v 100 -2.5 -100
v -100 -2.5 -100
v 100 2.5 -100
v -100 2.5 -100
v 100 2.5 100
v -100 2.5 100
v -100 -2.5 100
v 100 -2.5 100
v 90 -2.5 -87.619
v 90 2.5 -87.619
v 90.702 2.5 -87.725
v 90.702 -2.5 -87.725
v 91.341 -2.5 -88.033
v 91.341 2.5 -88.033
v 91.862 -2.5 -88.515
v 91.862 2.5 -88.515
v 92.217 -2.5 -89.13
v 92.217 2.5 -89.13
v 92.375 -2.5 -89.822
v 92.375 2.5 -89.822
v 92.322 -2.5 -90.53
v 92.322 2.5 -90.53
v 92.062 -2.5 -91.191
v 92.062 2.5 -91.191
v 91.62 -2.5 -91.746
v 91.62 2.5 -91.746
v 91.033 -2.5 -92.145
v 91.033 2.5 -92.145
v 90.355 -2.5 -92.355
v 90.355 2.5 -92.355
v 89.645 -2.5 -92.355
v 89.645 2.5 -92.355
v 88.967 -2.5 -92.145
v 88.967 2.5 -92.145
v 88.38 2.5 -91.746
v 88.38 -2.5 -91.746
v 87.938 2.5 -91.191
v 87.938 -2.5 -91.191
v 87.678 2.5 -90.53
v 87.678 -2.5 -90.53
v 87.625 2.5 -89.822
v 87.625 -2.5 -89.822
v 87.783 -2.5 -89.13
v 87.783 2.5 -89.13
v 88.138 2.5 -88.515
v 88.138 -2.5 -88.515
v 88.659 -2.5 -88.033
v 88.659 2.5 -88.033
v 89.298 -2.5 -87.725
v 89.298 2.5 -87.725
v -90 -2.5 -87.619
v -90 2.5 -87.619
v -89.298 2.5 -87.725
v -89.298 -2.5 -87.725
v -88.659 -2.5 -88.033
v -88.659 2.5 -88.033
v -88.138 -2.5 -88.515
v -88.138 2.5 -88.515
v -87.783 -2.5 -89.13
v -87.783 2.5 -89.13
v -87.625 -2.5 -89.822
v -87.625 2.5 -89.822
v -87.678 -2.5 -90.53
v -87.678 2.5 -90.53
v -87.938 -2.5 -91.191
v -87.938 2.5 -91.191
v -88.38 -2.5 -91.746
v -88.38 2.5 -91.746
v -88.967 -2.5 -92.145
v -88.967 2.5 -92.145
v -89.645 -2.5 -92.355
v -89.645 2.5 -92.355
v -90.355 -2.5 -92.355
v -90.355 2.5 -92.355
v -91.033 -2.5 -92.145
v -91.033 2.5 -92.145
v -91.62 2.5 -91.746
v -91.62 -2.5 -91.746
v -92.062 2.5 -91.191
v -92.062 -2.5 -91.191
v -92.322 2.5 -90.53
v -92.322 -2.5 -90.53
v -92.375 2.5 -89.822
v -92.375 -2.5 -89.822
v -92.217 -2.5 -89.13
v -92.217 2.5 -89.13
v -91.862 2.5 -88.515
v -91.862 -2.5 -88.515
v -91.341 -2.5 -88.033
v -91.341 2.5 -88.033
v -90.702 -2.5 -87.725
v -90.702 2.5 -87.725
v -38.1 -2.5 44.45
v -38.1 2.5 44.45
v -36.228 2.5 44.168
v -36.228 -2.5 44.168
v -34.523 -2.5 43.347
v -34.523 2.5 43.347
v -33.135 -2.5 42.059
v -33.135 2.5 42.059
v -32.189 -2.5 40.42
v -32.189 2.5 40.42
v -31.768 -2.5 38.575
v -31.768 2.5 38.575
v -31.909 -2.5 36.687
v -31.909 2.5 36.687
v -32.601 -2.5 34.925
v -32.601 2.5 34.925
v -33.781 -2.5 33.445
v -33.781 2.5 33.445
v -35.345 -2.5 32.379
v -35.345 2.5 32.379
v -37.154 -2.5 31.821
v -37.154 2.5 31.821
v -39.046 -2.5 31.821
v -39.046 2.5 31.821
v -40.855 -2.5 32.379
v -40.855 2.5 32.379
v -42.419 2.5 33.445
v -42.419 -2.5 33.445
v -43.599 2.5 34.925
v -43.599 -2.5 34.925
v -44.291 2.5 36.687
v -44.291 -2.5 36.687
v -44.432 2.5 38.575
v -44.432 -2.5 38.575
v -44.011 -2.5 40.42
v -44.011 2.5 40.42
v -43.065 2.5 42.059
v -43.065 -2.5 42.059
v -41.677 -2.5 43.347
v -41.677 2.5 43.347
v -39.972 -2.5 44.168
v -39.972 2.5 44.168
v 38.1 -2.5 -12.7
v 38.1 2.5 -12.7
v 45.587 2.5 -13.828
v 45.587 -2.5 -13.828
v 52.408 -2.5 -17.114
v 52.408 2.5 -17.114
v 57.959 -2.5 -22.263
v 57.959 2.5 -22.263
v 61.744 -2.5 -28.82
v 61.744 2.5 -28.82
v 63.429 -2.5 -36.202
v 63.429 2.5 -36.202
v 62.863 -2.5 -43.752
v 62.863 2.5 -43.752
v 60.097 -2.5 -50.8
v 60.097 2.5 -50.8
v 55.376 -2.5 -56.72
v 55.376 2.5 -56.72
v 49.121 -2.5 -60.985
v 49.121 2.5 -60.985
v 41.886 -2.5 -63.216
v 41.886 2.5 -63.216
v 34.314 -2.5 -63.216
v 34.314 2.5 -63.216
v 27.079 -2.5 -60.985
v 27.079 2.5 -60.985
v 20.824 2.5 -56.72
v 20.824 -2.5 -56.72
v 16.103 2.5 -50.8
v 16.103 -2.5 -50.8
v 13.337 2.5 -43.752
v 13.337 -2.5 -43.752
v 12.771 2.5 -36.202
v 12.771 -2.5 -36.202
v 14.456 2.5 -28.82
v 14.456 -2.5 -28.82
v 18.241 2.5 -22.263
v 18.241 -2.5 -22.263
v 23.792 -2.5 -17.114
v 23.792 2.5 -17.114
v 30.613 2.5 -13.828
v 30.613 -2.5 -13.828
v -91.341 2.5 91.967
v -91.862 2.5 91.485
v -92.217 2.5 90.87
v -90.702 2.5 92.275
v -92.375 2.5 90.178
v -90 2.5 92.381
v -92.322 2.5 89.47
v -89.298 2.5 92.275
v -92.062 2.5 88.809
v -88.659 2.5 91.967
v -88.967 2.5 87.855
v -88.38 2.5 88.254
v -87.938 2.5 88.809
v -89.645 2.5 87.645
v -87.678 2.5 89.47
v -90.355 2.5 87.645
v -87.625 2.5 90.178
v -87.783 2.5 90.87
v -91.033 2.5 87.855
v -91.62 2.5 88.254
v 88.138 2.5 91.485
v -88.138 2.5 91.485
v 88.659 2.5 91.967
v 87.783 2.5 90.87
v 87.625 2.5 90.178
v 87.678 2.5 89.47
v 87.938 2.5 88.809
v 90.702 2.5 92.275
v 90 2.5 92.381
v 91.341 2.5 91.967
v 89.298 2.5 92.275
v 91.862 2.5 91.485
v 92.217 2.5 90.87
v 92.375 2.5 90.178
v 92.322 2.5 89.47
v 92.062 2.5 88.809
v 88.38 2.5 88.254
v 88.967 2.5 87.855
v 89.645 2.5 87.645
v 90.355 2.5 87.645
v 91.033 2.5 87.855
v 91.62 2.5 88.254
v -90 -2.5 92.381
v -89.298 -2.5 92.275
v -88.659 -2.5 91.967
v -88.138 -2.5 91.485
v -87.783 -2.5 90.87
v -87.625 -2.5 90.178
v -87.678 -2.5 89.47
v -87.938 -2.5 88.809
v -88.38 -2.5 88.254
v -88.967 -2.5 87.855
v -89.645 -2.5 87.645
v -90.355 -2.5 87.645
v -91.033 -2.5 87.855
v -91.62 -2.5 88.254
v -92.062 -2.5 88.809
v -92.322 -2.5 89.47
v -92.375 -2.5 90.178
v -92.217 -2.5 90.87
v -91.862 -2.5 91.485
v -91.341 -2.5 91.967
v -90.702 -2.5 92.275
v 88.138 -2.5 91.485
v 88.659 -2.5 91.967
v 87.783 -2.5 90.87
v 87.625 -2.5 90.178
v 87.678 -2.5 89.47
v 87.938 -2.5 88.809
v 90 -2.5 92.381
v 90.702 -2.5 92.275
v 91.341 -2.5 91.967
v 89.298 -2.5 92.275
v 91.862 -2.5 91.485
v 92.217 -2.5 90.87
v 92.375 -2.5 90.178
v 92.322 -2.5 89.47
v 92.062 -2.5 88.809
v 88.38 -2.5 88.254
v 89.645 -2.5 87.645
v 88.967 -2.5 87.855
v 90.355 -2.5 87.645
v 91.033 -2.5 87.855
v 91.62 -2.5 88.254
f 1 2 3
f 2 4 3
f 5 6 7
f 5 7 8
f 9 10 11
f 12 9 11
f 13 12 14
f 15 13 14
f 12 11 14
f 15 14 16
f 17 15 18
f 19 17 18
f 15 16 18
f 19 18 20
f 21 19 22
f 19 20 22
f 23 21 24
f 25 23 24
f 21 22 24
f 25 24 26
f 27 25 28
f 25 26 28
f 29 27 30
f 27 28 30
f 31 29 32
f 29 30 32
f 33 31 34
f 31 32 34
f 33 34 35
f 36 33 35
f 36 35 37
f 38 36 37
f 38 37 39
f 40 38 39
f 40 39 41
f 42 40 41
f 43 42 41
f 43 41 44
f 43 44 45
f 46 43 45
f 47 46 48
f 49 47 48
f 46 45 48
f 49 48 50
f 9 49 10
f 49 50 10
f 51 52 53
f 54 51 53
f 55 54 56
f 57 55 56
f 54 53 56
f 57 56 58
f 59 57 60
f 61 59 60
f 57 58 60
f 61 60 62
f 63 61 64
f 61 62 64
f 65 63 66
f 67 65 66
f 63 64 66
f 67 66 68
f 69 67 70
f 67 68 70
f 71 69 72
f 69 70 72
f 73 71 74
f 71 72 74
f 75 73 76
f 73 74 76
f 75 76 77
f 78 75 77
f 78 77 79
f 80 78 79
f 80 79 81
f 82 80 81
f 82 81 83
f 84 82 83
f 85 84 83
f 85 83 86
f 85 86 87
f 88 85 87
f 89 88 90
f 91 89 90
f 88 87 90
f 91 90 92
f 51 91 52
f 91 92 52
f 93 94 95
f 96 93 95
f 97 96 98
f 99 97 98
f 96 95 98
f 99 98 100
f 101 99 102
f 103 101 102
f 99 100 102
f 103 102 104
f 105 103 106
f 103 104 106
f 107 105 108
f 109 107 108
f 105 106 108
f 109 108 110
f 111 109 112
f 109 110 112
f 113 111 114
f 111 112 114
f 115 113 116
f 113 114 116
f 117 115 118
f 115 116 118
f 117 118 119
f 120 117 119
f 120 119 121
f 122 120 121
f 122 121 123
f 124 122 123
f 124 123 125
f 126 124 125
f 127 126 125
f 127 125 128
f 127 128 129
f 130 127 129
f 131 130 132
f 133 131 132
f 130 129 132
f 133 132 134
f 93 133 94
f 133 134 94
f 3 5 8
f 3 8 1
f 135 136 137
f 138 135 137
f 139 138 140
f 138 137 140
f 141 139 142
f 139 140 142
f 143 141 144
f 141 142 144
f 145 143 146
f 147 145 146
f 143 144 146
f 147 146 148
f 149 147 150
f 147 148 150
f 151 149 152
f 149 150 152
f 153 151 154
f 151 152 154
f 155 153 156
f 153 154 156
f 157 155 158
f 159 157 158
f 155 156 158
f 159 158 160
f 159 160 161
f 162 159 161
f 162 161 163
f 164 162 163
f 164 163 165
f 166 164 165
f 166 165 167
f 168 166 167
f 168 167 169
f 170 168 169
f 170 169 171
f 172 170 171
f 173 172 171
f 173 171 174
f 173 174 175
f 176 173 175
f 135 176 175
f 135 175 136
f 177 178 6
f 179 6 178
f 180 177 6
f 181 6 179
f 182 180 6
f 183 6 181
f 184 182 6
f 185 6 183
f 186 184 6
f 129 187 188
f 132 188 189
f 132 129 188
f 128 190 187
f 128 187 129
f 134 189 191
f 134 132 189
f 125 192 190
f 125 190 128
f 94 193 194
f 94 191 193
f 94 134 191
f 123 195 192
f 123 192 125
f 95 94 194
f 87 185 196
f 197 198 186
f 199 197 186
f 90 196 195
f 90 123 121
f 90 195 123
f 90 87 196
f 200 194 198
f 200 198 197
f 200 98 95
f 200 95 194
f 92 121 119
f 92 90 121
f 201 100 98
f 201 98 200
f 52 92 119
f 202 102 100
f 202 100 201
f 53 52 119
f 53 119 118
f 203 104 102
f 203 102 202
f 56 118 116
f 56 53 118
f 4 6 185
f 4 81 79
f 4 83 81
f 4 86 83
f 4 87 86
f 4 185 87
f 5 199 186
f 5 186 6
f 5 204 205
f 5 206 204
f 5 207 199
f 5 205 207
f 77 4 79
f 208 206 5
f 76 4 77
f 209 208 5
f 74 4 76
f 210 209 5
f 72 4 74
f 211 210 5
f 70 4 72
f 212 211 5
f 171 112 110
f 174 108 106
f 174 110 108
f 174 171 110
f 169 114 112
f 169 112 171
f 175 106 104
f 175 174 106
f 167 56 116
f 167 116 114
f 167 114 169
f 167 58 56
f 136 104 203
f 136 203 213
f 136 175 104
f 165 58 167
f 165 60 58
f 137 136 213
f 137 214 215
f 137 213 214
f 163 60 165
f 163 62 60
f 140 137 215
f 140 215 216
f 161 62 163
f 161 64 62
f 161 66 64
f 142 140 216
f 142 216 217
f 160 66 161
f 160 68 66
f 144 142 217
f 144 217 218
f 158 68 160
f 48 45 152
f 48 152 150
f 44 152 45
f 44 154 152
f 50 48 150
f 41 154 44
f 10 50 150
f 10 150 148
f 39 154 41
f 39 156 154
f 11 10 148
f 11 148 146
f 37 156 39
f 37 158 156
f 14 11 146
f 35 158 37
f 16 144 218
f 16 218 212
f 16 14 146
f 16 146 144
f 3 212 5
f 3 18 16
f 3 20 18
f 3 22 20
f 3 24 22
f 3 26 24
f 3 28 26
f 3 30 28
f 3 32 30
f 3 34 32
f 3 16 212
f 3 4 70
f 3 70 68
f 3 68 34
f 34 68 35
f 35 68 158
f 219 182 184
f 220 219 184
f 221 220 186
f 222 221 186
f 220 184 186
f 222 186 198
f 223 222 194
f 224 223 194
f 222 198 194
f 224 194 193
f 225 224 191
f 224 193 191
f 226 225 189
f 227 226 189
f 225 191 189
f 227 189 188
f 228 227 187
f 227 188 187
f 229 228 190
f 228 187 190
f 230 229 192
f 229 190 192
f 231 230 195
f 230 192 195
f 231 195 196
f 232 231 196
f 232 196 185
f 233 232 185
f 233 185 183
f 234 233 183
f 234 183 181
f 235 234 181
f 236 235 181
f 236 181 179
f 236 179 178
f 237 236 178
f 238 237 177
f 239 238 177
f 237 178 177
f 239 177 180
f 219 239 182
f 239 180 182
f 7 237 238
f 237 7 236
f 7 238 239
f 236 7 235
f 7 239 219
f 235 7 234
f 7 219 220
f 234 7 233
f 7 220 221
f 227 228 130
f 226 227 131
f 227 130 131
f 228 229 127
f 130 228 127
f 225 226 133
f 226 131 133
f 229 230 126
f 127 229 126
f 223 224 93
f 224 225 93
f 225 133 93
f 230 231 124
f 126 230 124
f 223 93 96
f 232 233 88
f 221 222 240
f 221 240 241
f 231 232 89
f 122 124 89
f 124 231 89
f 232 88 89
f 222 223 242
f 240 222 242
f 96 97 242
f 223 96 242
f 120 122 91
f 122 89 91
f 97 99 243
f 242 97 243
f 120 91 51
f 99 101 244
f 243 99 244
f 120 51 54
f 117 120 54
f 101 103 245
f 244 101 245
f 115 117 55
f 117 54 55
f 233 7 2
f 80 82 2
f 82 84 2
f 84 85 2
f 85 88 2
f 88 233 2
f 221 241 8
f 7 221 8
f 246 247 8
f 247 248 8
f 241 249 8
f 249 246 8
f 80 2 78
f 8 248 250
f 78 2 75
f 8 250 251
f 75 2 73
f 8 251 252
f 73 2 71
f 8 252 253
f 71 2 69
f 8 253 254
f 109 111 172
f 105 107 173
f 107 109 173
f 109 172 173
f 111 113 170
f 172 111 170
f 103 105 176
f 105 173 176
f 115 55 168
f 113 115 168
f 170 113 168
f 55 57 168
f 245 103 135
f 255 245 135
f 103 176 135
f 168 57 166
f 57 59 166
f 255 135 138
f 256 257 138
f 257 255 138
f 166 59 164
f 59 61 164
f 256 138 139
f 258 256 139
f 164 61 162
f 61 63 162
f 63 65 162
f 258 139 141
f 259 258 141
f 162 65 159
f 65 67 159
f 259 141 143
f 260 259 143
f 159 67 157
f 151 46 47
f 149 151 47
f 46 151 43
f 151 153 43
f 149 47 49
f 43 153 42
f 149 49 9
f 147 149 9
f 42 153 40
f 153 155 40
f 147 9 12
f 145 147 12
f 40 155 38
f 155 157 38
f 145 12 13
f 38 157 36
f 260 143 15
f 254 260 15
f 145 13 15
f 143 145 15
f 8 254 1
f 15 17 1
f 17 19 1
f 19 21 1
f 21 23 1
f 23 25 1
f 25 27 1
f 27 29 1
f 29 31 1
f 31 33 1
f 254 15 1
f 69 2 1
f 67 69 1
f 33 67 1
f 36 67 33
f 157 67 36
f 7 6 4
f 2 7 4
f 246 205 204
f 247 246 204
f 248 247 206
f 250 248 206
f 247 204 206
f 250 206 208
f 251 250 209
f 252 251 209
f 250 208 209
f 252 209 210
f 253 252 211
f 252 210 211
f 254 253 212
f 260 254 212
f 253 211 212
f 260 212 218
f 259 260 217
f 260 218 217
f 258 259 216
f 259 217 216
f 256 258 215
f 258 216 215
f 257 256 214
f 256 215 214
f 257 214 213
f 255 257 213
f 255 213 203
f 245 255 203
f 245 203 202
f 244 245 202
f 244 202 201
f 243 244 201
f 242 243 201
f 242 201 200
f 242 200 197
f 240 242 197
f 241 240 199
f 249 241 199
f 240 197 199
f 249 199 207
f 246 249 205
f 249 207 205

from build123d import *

# Parameters (mm, degrees)
SKETCH1_W           = 200
SKETCH1_H           = 200
BOSS_EXTRUDE1_DEPTH = 2.5
SKETCH2_R           = 2.38125
CUT_EXTRUDE1_DEPTH  = 5
SKETCH3_R           = 6.35
CUT_EXTRUDE2_DEPTH  = 5
SKETCH4_R           = 25.4
CUT_EXTRUDE3_DEPTH  = 142.509716981


with BuildPart() as part:
    # Sketch1 → Boss-Extrude1 (new, symmetric)
    with BuildSketch(Plane(origin=(0, 0, 0), x_dir=(1, 0, 0), z_dir=(0, 1, 0))):
        Rectangle(SKETCH1_W, SKETCH1_H)
    extrude(amount=BOSS_EXTRUDE1_DEPTH, both=True)

    # Sketch2 → Cut-Extrude1 (cut)
    with BuildSketch(Plane(origin=(0, 2.5, 0), x_dir=(1, 0, 0), z_dir=(0, 1, 0))):
        with Locations(Location((-90, 90, 0), (0, 0, 270))):
            Circle(SKETCH2_R)
        with Locations(Location((90, 90, 0), (0, 0, 270))):
            Circle(SKETCH2_R)
        with Locations(Location((-90, -90, 0), (0, 0, 270))):
            Circle(SKETCH2_R)
        with Locations(Location((90, -90, 0), (0, 0, 270))):
            Circle(SKETCH2_R)
    extrude(amount=-CUT_EXTRUDE1_DEPTH, mode=Mode.SUBTRACT)

    # Sketch3 → Cut-Extrude2 (cut)
    with BuildSketch(Plane(origin=(0, 2.5, 0), x_dir=(1, 0, 0), z_dir=(0, 1, 0))):
        with Locations(Location((-38.1, -38.1, 0), (0, 0, 270))):
            Circle(SKETCH3_R)
    extrude(amount=-CUT_EXTRUDE2_DEPTH, mode=Mode.SUBTRACT)

    # Sketch4 → Cut-Extrude3 (cut, through all)
    with BuildSketch(Plane(origin=(0, 2.5, 0), x_dir=(1, 0, 0), z_dir=(0, 1, 0))):
        with Locations(Location((38.1, 38.1, 0), (0, 0, 270))):
            Circle(SKETCH4_R)
    extrude(amount=-CUT_EXTRUDE3_DEPTH, mode=Mode.SUBTRACT)


solid = part.part
